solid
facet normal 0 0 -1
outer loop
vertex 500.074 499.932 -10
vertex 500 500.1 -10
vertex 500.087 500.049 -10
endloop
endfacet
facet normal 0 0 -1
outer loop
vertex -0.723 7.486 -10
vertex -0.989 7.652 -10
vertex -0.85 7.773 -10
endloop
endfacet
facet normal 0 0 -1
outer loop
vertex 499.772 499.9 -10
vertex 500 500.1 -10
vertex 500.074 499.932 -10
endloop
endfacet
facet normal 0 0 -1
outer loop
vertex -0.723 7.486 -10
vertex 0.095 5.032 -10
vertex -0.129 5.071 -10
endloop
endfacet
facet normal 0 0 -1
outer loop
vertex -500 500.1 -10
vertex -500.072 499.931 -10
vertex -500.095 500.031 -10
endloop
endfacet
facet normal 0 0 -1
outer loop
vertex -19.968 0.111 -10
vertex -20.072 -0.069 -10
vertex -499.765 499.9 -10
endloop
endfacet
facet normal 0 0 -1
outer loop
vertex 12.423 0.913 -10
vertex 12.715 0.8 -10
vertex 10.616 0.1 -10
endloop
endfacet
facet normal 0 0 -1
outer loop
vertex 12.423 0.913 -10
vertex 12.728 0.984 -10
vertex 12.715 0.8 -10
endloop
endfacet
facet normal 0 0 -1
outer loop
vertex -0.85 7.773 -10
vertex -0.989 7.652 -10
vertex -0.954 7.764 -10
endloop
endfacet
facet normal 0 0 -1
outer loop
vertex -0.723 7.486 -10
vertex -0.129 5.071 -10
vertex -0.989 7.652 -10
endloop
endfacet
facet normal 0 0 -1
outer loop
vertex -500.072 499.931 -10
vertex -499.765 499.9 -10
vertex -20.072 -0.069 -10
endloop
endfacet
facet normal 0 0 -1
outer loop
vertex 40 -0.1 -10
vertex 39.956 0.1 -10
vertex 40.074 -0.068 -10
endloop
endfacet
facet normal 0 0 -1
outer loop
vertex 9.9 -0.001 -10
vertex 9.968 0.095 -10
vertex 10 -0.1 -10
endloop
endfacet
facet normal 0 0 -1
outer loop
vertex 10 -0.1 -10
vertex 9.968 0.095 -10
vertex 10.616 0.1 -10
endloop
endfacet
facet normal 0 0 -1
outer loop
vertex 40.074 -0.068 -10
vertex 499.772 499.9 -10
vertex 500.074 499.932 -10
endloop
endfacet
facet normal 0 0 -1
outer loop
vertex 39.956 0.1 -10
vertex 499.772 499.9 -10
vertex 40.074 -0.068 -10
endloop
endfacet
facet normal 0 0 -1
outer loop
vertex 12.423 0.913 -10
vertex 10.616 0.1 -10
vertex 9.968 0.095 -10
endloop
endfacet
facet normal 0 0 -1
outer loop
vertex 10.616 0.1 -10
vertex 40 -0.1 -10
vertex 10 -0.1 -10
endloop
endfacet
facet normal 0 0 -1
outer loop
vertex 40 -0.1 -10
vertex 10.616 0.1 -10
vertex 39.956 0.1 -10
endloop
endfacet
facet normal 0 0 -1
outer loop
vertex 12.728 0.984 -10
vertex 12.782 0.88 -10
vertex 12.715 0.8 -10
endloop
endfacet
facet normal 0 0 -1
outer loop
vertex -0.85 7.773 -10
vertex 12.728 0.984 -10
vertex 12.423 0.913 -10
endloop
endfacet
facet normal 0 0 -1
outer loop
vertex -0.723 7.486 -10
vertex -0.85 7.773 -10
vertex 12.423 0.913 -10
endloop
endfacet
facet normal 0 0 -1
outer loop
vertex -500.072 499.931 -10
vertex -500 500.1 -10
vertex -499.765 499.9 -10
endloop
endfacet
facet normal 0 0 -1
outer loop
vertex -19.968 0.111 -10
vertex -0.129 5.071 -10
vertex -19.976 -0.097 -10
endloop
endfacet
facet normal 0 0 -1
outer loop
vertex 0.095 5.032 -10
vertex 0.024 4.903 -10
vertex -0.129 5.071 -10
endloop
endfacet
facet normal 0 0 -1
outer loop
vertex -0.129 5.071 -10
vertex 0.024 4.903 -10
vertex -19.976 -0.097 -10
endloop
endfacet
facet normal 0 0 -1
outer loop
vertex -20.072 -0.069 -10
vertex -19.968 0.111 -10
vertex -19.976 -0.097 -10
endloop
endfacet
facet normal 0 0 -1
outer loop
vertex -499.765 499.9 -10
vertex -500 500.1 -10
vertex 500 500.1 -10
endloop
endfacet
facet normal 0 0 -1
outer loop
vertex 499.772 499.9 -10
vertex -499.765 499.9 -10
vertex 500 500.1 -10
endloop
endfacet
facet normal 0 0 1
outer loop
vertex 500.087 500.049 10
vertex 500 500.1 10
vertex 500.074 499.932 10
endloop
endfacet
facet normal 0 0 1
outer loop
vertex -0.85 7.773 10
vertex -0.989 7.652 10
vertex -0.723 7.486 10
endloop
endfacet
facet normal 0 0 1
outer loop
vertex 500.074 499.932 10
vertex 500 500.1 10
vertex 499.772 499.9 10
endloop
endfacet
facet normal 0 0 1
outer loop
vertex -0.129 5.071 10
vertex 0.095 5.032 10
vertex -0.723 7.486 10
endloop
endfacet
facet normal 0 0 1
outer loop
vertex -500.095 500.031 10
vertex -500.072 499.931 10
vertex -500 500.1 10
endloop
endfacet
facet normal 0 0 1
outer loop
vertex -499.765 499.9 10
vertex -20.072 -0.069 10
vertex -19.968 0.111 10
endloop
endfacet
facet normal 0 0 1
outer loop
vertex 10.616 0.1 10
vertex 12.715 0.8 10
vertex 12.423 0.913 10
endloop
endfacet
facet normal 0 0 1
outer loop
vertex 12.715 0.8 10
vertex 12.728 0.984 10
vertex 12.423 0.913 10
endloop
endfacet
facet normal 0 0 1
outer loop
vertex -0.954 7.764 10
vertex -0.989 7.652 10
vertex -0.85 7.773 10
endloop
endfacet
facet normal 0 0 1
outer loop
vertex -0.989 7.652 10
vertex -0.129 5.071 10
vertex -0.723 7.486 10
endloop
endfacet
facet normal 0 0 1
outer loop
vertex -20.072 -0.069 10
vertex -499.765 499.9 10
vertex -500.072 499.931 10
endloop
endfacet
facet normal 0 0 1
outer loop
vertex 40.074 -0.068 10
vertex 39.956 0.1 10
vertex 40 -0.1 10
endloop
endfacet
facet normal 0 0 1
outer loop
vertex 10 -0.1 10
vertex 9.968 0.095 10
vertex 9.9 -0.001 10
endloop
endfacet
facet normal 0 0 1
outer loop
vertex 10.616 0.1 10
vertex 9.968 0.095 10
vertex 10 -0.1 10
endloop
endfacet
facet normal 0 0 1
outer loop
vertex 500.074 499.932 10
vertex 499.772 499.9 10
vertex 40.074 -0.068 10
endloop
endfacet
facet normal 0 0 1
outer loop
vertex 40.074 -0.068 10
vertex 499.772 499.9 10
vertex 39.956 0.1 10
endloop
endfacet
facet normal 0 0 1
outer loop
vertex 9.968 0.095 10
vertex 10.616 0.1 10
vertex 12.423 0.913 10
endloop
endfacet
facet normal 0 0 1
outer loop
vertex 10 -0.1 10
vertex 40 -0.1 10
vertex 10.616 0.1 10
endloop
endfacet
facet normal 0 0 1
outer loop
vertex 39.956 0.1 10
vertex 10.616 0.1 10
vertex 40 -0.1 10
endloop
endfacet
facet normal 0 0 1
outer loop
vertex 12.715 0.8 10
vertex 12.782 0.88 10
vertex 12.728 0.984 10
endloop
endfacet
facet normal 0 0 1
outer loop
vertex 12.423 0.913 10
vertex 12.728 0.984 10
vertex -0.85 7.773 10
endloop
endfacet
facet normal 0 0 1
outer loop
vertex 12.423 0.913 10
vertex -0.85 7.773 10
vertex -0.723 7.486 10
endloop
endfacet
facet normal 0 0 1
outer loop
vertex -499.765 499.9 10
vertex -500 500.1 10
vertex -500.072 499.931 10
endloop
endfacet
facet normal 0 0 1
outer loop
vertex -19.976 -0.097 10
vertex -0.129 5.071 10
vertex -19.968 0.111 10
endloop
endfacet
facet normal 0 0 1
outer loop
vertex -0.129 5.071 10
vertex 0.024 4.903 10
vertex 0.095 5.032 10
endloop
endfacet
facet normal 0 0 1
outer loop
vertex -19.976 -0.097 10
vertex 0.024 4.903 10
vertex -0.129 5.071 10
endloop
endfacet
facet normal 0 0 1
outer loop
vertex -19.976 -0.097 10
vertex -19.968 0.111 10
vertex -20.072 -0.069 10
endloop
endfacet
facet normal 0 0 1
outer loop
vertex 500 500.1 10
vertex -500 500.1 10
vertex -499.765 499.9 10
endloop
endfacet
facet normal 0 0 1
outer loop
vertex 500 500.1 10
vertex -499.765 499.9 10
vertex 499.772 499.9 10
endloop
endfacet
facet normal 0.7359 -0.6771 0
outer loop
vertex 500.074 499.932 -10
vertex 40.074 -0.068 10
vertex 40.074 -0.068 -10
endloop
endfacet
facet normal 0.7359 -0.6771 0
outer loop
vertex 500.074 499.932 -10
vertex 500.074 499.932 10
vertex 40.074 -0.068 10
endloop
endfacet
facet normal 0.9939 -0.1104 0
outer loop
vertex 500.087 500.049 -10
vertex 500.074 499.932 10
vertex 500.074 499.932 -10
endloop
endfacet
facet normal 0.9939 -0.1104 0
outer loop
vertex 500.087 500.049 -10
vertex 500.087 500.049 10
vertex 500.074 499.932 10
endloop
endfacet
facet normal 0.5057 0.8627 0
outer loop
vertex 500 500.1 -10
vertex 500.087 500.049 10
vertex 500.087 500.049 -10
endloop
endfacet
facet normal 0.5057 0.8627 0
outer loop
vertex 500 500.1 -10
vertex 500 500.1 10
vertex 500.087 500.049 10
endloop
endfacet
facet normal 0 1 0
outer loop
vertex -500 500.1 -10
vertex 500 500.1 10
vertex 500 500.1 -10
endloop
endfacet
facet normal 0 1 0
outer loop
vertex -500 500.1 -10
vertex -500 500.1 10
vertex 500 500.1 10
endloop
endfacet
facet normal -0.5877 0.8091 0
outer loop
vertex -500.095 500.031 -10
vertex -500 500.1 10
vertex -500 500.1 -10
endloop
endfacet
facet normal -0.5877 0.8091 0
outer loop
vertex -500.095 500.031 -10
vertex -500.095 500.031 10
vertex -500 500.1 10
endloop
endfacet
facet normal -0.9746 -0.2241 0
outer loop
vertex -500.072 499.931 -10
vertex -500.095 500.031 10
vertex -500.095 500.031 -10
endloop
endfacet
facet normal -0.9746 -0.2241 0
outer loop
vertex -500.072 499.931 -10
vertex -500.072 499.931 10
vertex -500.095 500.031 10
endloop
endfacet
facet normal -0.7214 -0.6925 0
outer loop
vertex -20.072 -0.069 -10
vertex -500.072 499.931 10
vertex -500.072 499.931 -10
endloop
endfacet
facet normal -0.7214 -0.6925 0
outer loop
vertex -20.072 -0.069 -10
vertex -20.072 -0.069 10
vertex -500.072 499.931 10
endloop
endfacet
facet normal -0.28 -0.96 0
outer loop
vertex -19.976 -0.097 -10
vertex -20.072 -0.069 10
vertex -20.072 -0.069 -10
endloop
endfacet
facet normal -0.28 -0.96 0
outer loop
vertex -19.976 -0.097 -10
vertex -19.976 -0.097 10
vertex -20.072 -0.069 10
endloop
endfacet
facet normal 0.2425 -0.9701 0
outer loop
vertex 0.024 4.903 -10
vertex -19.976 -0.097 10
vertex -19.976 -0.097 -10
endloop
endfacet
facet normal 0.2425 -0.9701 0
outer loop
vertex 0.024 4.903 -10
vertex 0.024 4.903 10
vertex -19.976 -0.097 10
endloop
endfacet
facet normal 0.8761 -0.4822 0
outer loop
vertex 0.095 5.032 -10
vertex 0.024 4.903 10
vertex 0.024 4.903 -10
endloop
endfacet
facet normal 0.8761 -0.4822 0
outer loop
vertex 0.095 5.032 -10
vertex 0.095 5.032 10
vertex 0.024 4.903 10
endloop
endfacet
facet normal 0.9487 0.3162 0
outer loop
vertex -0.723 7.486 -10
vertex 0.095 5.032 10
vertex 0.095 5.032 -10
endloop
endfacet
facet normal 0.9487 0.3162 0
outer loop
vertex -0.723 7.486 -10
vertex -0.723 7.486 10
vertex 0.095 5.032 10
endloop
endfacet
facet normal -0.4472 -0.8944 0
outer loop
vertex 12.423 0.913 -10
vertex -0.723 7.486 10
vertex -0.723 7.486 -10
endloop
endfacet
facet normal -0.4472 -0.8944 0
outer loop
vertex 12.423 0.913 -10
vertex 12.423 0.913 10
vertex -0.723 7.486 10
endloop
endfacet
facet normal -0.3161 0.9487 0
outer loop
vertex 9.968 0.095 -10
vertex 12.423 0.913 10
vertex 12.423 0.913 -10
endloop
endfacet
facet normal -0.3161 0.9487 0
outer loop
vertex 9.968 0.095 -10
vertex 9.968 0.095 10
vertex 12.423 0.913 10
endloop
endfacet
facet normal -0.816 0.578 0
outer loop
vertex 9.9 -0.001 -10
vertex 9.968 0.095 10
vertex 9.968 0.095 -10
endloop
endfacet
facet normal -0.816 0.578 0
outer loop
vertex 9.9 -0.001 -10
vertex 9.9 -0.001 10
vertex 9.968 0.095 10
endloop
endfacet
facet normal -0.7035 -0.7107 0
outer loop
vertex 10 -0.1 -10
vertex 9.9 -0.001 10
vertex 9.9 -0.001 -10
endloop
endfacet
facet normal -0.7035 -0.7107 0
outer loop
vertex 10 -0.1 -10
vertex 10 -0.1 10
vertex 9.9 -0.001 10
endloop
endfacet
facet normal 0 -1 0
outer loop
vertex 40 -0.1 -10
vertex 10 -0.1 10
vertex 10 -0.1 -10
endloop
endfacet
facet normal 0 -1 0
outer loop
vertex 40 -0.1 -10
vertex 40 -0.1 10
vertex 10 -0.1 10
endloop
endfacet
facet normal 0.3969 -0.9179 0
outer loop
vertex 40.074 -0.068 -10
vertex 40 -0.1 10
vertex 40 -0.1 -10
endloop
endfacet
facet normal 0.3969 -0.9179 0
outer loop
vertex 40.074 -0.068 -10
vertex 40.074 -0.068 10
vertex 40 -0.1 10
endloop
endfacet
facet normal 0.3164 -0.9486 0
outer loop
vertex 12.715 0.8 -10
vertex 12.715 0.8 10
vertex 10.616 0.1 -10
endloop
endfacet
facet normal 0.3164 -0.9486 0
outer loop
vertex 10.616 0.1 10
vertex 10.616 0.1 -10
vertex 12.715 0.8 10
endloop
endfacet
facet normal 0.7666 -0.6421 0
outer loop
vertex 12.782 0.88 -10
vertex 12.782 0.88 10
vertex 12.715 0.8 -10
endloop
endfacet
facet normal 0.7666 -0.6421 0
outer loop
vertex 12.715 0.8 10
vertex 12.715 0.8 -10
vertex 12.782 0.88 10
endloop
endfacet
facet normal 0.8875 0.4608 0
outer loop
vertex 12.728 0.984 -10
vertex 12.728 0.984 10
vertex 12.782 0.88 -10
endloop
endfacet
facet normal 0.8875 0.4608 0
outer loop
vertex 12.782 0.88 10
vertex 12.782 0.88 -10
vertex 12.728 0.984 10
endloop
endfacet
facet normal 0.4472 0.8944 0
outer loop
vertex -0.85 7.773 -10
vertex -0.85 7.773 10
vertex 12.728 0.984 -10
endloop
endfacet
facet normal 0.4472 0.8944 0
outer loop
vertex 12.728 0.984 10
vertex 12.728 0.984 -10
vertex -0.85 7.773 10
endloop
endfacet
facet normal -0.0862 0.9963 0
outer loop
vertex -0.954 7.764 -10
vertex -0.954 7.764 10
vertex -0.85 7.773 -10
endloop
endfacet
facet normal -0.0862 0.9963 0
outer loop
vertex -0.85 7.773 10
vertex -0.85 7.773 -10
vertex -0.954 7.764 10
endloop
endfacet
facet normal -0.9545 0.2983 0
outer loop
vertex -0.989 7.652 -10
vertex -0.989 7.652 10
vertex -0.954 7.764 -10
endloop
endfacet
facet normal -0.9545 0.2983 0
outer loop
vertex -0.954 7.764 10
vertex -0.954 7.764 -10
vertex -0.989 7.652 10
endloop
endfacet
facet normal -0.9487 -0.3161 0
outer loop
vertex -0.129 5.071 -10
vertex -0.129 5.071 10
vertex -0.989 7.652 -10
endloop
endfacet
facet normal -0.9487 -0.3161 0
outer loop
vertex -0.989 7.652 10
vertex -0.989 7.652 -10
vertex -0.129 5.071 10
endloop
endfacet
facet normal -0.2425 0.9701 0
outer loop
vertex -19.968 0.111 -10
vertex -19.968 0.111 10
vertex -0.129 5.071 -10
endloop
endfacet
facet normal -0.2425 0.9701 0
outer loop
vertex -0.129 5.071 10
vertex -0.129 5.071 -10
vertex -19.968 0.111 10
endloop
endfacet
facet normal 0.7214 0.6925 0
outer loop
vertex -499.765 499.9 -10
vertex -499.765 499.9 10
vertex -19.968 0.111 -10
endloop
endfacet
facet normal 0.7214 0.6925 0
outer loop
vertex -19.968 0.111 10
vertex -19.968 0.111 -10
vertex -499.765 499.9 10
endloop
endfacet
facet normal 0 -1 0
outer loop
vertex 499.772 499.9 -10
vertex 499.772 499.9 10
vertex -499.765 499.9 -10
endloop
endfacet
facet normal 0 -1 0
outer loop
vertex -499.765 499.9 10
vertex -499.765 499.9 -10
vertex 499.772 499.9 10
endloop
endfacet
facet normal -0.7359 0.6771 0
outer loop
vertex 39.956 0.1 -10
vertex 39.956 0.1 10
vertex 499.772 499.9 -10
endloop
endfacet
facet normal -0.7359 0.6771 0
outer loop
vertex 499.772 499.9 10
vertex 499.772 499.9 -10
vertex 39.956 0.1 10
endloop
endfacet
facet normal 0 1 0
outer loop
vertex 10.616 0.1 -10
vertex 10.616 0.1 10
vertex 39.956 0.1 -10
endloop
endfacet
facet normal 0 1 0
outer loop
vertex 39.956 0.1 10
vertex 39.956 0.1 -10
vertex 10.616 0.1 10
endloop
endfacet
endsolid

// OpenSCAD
trackSeparatorSimple([[-20,00],[0,5,2],[10,0], [40,0]],0.1);

module trackSeparatorSimple(Points, D) {
    _buildSeparatorWall(D)
       _buildSeparatorLine(Points); 
}

module _buildSeparatorLine(Points) {
    polygon(concat([[-500,500]],
        _buildSeparatorLine2(Points)
        ,[[500,500]])
        );
}

function _buildSeparatorLine2(Points, i = 0) =
    (i < len(Points) ? 
        concat((len(Points[i]) > 2 ?
                 _trickSeparatrJoint(Points[i], Points[i+1], Points[i][2]) : [Points[i]]),
               _buildSeparatorLine2(Points, i+1))
     : []);

function _trickSeparatrJoint(P1, P2, D) = 
    let (v = [ P2[0]-P1[0], P2[1]-P1[1]],
         dir_v = v / norm(v),
         dir_T = [-dir_v[1], dir_v[0]])
    [[P1[0], P1[1]],
     [P1[0] + D*(-dir_v[0]+dir_T[0]), P1[1] + D*(-dir_v[1]+dir_T[1])],
     [P2[0] + D*(dir_v[0]+dir_T[0]), P2[1] + D*(+dir_v[1]+dir_T[1])]];

module _buildSeparatorWall(D) {
    translate([0,0,-10])
    linear_extrude(20)
    difference() {
        offset(D) children(0);
        offset(-D) children(0);
    }
}
